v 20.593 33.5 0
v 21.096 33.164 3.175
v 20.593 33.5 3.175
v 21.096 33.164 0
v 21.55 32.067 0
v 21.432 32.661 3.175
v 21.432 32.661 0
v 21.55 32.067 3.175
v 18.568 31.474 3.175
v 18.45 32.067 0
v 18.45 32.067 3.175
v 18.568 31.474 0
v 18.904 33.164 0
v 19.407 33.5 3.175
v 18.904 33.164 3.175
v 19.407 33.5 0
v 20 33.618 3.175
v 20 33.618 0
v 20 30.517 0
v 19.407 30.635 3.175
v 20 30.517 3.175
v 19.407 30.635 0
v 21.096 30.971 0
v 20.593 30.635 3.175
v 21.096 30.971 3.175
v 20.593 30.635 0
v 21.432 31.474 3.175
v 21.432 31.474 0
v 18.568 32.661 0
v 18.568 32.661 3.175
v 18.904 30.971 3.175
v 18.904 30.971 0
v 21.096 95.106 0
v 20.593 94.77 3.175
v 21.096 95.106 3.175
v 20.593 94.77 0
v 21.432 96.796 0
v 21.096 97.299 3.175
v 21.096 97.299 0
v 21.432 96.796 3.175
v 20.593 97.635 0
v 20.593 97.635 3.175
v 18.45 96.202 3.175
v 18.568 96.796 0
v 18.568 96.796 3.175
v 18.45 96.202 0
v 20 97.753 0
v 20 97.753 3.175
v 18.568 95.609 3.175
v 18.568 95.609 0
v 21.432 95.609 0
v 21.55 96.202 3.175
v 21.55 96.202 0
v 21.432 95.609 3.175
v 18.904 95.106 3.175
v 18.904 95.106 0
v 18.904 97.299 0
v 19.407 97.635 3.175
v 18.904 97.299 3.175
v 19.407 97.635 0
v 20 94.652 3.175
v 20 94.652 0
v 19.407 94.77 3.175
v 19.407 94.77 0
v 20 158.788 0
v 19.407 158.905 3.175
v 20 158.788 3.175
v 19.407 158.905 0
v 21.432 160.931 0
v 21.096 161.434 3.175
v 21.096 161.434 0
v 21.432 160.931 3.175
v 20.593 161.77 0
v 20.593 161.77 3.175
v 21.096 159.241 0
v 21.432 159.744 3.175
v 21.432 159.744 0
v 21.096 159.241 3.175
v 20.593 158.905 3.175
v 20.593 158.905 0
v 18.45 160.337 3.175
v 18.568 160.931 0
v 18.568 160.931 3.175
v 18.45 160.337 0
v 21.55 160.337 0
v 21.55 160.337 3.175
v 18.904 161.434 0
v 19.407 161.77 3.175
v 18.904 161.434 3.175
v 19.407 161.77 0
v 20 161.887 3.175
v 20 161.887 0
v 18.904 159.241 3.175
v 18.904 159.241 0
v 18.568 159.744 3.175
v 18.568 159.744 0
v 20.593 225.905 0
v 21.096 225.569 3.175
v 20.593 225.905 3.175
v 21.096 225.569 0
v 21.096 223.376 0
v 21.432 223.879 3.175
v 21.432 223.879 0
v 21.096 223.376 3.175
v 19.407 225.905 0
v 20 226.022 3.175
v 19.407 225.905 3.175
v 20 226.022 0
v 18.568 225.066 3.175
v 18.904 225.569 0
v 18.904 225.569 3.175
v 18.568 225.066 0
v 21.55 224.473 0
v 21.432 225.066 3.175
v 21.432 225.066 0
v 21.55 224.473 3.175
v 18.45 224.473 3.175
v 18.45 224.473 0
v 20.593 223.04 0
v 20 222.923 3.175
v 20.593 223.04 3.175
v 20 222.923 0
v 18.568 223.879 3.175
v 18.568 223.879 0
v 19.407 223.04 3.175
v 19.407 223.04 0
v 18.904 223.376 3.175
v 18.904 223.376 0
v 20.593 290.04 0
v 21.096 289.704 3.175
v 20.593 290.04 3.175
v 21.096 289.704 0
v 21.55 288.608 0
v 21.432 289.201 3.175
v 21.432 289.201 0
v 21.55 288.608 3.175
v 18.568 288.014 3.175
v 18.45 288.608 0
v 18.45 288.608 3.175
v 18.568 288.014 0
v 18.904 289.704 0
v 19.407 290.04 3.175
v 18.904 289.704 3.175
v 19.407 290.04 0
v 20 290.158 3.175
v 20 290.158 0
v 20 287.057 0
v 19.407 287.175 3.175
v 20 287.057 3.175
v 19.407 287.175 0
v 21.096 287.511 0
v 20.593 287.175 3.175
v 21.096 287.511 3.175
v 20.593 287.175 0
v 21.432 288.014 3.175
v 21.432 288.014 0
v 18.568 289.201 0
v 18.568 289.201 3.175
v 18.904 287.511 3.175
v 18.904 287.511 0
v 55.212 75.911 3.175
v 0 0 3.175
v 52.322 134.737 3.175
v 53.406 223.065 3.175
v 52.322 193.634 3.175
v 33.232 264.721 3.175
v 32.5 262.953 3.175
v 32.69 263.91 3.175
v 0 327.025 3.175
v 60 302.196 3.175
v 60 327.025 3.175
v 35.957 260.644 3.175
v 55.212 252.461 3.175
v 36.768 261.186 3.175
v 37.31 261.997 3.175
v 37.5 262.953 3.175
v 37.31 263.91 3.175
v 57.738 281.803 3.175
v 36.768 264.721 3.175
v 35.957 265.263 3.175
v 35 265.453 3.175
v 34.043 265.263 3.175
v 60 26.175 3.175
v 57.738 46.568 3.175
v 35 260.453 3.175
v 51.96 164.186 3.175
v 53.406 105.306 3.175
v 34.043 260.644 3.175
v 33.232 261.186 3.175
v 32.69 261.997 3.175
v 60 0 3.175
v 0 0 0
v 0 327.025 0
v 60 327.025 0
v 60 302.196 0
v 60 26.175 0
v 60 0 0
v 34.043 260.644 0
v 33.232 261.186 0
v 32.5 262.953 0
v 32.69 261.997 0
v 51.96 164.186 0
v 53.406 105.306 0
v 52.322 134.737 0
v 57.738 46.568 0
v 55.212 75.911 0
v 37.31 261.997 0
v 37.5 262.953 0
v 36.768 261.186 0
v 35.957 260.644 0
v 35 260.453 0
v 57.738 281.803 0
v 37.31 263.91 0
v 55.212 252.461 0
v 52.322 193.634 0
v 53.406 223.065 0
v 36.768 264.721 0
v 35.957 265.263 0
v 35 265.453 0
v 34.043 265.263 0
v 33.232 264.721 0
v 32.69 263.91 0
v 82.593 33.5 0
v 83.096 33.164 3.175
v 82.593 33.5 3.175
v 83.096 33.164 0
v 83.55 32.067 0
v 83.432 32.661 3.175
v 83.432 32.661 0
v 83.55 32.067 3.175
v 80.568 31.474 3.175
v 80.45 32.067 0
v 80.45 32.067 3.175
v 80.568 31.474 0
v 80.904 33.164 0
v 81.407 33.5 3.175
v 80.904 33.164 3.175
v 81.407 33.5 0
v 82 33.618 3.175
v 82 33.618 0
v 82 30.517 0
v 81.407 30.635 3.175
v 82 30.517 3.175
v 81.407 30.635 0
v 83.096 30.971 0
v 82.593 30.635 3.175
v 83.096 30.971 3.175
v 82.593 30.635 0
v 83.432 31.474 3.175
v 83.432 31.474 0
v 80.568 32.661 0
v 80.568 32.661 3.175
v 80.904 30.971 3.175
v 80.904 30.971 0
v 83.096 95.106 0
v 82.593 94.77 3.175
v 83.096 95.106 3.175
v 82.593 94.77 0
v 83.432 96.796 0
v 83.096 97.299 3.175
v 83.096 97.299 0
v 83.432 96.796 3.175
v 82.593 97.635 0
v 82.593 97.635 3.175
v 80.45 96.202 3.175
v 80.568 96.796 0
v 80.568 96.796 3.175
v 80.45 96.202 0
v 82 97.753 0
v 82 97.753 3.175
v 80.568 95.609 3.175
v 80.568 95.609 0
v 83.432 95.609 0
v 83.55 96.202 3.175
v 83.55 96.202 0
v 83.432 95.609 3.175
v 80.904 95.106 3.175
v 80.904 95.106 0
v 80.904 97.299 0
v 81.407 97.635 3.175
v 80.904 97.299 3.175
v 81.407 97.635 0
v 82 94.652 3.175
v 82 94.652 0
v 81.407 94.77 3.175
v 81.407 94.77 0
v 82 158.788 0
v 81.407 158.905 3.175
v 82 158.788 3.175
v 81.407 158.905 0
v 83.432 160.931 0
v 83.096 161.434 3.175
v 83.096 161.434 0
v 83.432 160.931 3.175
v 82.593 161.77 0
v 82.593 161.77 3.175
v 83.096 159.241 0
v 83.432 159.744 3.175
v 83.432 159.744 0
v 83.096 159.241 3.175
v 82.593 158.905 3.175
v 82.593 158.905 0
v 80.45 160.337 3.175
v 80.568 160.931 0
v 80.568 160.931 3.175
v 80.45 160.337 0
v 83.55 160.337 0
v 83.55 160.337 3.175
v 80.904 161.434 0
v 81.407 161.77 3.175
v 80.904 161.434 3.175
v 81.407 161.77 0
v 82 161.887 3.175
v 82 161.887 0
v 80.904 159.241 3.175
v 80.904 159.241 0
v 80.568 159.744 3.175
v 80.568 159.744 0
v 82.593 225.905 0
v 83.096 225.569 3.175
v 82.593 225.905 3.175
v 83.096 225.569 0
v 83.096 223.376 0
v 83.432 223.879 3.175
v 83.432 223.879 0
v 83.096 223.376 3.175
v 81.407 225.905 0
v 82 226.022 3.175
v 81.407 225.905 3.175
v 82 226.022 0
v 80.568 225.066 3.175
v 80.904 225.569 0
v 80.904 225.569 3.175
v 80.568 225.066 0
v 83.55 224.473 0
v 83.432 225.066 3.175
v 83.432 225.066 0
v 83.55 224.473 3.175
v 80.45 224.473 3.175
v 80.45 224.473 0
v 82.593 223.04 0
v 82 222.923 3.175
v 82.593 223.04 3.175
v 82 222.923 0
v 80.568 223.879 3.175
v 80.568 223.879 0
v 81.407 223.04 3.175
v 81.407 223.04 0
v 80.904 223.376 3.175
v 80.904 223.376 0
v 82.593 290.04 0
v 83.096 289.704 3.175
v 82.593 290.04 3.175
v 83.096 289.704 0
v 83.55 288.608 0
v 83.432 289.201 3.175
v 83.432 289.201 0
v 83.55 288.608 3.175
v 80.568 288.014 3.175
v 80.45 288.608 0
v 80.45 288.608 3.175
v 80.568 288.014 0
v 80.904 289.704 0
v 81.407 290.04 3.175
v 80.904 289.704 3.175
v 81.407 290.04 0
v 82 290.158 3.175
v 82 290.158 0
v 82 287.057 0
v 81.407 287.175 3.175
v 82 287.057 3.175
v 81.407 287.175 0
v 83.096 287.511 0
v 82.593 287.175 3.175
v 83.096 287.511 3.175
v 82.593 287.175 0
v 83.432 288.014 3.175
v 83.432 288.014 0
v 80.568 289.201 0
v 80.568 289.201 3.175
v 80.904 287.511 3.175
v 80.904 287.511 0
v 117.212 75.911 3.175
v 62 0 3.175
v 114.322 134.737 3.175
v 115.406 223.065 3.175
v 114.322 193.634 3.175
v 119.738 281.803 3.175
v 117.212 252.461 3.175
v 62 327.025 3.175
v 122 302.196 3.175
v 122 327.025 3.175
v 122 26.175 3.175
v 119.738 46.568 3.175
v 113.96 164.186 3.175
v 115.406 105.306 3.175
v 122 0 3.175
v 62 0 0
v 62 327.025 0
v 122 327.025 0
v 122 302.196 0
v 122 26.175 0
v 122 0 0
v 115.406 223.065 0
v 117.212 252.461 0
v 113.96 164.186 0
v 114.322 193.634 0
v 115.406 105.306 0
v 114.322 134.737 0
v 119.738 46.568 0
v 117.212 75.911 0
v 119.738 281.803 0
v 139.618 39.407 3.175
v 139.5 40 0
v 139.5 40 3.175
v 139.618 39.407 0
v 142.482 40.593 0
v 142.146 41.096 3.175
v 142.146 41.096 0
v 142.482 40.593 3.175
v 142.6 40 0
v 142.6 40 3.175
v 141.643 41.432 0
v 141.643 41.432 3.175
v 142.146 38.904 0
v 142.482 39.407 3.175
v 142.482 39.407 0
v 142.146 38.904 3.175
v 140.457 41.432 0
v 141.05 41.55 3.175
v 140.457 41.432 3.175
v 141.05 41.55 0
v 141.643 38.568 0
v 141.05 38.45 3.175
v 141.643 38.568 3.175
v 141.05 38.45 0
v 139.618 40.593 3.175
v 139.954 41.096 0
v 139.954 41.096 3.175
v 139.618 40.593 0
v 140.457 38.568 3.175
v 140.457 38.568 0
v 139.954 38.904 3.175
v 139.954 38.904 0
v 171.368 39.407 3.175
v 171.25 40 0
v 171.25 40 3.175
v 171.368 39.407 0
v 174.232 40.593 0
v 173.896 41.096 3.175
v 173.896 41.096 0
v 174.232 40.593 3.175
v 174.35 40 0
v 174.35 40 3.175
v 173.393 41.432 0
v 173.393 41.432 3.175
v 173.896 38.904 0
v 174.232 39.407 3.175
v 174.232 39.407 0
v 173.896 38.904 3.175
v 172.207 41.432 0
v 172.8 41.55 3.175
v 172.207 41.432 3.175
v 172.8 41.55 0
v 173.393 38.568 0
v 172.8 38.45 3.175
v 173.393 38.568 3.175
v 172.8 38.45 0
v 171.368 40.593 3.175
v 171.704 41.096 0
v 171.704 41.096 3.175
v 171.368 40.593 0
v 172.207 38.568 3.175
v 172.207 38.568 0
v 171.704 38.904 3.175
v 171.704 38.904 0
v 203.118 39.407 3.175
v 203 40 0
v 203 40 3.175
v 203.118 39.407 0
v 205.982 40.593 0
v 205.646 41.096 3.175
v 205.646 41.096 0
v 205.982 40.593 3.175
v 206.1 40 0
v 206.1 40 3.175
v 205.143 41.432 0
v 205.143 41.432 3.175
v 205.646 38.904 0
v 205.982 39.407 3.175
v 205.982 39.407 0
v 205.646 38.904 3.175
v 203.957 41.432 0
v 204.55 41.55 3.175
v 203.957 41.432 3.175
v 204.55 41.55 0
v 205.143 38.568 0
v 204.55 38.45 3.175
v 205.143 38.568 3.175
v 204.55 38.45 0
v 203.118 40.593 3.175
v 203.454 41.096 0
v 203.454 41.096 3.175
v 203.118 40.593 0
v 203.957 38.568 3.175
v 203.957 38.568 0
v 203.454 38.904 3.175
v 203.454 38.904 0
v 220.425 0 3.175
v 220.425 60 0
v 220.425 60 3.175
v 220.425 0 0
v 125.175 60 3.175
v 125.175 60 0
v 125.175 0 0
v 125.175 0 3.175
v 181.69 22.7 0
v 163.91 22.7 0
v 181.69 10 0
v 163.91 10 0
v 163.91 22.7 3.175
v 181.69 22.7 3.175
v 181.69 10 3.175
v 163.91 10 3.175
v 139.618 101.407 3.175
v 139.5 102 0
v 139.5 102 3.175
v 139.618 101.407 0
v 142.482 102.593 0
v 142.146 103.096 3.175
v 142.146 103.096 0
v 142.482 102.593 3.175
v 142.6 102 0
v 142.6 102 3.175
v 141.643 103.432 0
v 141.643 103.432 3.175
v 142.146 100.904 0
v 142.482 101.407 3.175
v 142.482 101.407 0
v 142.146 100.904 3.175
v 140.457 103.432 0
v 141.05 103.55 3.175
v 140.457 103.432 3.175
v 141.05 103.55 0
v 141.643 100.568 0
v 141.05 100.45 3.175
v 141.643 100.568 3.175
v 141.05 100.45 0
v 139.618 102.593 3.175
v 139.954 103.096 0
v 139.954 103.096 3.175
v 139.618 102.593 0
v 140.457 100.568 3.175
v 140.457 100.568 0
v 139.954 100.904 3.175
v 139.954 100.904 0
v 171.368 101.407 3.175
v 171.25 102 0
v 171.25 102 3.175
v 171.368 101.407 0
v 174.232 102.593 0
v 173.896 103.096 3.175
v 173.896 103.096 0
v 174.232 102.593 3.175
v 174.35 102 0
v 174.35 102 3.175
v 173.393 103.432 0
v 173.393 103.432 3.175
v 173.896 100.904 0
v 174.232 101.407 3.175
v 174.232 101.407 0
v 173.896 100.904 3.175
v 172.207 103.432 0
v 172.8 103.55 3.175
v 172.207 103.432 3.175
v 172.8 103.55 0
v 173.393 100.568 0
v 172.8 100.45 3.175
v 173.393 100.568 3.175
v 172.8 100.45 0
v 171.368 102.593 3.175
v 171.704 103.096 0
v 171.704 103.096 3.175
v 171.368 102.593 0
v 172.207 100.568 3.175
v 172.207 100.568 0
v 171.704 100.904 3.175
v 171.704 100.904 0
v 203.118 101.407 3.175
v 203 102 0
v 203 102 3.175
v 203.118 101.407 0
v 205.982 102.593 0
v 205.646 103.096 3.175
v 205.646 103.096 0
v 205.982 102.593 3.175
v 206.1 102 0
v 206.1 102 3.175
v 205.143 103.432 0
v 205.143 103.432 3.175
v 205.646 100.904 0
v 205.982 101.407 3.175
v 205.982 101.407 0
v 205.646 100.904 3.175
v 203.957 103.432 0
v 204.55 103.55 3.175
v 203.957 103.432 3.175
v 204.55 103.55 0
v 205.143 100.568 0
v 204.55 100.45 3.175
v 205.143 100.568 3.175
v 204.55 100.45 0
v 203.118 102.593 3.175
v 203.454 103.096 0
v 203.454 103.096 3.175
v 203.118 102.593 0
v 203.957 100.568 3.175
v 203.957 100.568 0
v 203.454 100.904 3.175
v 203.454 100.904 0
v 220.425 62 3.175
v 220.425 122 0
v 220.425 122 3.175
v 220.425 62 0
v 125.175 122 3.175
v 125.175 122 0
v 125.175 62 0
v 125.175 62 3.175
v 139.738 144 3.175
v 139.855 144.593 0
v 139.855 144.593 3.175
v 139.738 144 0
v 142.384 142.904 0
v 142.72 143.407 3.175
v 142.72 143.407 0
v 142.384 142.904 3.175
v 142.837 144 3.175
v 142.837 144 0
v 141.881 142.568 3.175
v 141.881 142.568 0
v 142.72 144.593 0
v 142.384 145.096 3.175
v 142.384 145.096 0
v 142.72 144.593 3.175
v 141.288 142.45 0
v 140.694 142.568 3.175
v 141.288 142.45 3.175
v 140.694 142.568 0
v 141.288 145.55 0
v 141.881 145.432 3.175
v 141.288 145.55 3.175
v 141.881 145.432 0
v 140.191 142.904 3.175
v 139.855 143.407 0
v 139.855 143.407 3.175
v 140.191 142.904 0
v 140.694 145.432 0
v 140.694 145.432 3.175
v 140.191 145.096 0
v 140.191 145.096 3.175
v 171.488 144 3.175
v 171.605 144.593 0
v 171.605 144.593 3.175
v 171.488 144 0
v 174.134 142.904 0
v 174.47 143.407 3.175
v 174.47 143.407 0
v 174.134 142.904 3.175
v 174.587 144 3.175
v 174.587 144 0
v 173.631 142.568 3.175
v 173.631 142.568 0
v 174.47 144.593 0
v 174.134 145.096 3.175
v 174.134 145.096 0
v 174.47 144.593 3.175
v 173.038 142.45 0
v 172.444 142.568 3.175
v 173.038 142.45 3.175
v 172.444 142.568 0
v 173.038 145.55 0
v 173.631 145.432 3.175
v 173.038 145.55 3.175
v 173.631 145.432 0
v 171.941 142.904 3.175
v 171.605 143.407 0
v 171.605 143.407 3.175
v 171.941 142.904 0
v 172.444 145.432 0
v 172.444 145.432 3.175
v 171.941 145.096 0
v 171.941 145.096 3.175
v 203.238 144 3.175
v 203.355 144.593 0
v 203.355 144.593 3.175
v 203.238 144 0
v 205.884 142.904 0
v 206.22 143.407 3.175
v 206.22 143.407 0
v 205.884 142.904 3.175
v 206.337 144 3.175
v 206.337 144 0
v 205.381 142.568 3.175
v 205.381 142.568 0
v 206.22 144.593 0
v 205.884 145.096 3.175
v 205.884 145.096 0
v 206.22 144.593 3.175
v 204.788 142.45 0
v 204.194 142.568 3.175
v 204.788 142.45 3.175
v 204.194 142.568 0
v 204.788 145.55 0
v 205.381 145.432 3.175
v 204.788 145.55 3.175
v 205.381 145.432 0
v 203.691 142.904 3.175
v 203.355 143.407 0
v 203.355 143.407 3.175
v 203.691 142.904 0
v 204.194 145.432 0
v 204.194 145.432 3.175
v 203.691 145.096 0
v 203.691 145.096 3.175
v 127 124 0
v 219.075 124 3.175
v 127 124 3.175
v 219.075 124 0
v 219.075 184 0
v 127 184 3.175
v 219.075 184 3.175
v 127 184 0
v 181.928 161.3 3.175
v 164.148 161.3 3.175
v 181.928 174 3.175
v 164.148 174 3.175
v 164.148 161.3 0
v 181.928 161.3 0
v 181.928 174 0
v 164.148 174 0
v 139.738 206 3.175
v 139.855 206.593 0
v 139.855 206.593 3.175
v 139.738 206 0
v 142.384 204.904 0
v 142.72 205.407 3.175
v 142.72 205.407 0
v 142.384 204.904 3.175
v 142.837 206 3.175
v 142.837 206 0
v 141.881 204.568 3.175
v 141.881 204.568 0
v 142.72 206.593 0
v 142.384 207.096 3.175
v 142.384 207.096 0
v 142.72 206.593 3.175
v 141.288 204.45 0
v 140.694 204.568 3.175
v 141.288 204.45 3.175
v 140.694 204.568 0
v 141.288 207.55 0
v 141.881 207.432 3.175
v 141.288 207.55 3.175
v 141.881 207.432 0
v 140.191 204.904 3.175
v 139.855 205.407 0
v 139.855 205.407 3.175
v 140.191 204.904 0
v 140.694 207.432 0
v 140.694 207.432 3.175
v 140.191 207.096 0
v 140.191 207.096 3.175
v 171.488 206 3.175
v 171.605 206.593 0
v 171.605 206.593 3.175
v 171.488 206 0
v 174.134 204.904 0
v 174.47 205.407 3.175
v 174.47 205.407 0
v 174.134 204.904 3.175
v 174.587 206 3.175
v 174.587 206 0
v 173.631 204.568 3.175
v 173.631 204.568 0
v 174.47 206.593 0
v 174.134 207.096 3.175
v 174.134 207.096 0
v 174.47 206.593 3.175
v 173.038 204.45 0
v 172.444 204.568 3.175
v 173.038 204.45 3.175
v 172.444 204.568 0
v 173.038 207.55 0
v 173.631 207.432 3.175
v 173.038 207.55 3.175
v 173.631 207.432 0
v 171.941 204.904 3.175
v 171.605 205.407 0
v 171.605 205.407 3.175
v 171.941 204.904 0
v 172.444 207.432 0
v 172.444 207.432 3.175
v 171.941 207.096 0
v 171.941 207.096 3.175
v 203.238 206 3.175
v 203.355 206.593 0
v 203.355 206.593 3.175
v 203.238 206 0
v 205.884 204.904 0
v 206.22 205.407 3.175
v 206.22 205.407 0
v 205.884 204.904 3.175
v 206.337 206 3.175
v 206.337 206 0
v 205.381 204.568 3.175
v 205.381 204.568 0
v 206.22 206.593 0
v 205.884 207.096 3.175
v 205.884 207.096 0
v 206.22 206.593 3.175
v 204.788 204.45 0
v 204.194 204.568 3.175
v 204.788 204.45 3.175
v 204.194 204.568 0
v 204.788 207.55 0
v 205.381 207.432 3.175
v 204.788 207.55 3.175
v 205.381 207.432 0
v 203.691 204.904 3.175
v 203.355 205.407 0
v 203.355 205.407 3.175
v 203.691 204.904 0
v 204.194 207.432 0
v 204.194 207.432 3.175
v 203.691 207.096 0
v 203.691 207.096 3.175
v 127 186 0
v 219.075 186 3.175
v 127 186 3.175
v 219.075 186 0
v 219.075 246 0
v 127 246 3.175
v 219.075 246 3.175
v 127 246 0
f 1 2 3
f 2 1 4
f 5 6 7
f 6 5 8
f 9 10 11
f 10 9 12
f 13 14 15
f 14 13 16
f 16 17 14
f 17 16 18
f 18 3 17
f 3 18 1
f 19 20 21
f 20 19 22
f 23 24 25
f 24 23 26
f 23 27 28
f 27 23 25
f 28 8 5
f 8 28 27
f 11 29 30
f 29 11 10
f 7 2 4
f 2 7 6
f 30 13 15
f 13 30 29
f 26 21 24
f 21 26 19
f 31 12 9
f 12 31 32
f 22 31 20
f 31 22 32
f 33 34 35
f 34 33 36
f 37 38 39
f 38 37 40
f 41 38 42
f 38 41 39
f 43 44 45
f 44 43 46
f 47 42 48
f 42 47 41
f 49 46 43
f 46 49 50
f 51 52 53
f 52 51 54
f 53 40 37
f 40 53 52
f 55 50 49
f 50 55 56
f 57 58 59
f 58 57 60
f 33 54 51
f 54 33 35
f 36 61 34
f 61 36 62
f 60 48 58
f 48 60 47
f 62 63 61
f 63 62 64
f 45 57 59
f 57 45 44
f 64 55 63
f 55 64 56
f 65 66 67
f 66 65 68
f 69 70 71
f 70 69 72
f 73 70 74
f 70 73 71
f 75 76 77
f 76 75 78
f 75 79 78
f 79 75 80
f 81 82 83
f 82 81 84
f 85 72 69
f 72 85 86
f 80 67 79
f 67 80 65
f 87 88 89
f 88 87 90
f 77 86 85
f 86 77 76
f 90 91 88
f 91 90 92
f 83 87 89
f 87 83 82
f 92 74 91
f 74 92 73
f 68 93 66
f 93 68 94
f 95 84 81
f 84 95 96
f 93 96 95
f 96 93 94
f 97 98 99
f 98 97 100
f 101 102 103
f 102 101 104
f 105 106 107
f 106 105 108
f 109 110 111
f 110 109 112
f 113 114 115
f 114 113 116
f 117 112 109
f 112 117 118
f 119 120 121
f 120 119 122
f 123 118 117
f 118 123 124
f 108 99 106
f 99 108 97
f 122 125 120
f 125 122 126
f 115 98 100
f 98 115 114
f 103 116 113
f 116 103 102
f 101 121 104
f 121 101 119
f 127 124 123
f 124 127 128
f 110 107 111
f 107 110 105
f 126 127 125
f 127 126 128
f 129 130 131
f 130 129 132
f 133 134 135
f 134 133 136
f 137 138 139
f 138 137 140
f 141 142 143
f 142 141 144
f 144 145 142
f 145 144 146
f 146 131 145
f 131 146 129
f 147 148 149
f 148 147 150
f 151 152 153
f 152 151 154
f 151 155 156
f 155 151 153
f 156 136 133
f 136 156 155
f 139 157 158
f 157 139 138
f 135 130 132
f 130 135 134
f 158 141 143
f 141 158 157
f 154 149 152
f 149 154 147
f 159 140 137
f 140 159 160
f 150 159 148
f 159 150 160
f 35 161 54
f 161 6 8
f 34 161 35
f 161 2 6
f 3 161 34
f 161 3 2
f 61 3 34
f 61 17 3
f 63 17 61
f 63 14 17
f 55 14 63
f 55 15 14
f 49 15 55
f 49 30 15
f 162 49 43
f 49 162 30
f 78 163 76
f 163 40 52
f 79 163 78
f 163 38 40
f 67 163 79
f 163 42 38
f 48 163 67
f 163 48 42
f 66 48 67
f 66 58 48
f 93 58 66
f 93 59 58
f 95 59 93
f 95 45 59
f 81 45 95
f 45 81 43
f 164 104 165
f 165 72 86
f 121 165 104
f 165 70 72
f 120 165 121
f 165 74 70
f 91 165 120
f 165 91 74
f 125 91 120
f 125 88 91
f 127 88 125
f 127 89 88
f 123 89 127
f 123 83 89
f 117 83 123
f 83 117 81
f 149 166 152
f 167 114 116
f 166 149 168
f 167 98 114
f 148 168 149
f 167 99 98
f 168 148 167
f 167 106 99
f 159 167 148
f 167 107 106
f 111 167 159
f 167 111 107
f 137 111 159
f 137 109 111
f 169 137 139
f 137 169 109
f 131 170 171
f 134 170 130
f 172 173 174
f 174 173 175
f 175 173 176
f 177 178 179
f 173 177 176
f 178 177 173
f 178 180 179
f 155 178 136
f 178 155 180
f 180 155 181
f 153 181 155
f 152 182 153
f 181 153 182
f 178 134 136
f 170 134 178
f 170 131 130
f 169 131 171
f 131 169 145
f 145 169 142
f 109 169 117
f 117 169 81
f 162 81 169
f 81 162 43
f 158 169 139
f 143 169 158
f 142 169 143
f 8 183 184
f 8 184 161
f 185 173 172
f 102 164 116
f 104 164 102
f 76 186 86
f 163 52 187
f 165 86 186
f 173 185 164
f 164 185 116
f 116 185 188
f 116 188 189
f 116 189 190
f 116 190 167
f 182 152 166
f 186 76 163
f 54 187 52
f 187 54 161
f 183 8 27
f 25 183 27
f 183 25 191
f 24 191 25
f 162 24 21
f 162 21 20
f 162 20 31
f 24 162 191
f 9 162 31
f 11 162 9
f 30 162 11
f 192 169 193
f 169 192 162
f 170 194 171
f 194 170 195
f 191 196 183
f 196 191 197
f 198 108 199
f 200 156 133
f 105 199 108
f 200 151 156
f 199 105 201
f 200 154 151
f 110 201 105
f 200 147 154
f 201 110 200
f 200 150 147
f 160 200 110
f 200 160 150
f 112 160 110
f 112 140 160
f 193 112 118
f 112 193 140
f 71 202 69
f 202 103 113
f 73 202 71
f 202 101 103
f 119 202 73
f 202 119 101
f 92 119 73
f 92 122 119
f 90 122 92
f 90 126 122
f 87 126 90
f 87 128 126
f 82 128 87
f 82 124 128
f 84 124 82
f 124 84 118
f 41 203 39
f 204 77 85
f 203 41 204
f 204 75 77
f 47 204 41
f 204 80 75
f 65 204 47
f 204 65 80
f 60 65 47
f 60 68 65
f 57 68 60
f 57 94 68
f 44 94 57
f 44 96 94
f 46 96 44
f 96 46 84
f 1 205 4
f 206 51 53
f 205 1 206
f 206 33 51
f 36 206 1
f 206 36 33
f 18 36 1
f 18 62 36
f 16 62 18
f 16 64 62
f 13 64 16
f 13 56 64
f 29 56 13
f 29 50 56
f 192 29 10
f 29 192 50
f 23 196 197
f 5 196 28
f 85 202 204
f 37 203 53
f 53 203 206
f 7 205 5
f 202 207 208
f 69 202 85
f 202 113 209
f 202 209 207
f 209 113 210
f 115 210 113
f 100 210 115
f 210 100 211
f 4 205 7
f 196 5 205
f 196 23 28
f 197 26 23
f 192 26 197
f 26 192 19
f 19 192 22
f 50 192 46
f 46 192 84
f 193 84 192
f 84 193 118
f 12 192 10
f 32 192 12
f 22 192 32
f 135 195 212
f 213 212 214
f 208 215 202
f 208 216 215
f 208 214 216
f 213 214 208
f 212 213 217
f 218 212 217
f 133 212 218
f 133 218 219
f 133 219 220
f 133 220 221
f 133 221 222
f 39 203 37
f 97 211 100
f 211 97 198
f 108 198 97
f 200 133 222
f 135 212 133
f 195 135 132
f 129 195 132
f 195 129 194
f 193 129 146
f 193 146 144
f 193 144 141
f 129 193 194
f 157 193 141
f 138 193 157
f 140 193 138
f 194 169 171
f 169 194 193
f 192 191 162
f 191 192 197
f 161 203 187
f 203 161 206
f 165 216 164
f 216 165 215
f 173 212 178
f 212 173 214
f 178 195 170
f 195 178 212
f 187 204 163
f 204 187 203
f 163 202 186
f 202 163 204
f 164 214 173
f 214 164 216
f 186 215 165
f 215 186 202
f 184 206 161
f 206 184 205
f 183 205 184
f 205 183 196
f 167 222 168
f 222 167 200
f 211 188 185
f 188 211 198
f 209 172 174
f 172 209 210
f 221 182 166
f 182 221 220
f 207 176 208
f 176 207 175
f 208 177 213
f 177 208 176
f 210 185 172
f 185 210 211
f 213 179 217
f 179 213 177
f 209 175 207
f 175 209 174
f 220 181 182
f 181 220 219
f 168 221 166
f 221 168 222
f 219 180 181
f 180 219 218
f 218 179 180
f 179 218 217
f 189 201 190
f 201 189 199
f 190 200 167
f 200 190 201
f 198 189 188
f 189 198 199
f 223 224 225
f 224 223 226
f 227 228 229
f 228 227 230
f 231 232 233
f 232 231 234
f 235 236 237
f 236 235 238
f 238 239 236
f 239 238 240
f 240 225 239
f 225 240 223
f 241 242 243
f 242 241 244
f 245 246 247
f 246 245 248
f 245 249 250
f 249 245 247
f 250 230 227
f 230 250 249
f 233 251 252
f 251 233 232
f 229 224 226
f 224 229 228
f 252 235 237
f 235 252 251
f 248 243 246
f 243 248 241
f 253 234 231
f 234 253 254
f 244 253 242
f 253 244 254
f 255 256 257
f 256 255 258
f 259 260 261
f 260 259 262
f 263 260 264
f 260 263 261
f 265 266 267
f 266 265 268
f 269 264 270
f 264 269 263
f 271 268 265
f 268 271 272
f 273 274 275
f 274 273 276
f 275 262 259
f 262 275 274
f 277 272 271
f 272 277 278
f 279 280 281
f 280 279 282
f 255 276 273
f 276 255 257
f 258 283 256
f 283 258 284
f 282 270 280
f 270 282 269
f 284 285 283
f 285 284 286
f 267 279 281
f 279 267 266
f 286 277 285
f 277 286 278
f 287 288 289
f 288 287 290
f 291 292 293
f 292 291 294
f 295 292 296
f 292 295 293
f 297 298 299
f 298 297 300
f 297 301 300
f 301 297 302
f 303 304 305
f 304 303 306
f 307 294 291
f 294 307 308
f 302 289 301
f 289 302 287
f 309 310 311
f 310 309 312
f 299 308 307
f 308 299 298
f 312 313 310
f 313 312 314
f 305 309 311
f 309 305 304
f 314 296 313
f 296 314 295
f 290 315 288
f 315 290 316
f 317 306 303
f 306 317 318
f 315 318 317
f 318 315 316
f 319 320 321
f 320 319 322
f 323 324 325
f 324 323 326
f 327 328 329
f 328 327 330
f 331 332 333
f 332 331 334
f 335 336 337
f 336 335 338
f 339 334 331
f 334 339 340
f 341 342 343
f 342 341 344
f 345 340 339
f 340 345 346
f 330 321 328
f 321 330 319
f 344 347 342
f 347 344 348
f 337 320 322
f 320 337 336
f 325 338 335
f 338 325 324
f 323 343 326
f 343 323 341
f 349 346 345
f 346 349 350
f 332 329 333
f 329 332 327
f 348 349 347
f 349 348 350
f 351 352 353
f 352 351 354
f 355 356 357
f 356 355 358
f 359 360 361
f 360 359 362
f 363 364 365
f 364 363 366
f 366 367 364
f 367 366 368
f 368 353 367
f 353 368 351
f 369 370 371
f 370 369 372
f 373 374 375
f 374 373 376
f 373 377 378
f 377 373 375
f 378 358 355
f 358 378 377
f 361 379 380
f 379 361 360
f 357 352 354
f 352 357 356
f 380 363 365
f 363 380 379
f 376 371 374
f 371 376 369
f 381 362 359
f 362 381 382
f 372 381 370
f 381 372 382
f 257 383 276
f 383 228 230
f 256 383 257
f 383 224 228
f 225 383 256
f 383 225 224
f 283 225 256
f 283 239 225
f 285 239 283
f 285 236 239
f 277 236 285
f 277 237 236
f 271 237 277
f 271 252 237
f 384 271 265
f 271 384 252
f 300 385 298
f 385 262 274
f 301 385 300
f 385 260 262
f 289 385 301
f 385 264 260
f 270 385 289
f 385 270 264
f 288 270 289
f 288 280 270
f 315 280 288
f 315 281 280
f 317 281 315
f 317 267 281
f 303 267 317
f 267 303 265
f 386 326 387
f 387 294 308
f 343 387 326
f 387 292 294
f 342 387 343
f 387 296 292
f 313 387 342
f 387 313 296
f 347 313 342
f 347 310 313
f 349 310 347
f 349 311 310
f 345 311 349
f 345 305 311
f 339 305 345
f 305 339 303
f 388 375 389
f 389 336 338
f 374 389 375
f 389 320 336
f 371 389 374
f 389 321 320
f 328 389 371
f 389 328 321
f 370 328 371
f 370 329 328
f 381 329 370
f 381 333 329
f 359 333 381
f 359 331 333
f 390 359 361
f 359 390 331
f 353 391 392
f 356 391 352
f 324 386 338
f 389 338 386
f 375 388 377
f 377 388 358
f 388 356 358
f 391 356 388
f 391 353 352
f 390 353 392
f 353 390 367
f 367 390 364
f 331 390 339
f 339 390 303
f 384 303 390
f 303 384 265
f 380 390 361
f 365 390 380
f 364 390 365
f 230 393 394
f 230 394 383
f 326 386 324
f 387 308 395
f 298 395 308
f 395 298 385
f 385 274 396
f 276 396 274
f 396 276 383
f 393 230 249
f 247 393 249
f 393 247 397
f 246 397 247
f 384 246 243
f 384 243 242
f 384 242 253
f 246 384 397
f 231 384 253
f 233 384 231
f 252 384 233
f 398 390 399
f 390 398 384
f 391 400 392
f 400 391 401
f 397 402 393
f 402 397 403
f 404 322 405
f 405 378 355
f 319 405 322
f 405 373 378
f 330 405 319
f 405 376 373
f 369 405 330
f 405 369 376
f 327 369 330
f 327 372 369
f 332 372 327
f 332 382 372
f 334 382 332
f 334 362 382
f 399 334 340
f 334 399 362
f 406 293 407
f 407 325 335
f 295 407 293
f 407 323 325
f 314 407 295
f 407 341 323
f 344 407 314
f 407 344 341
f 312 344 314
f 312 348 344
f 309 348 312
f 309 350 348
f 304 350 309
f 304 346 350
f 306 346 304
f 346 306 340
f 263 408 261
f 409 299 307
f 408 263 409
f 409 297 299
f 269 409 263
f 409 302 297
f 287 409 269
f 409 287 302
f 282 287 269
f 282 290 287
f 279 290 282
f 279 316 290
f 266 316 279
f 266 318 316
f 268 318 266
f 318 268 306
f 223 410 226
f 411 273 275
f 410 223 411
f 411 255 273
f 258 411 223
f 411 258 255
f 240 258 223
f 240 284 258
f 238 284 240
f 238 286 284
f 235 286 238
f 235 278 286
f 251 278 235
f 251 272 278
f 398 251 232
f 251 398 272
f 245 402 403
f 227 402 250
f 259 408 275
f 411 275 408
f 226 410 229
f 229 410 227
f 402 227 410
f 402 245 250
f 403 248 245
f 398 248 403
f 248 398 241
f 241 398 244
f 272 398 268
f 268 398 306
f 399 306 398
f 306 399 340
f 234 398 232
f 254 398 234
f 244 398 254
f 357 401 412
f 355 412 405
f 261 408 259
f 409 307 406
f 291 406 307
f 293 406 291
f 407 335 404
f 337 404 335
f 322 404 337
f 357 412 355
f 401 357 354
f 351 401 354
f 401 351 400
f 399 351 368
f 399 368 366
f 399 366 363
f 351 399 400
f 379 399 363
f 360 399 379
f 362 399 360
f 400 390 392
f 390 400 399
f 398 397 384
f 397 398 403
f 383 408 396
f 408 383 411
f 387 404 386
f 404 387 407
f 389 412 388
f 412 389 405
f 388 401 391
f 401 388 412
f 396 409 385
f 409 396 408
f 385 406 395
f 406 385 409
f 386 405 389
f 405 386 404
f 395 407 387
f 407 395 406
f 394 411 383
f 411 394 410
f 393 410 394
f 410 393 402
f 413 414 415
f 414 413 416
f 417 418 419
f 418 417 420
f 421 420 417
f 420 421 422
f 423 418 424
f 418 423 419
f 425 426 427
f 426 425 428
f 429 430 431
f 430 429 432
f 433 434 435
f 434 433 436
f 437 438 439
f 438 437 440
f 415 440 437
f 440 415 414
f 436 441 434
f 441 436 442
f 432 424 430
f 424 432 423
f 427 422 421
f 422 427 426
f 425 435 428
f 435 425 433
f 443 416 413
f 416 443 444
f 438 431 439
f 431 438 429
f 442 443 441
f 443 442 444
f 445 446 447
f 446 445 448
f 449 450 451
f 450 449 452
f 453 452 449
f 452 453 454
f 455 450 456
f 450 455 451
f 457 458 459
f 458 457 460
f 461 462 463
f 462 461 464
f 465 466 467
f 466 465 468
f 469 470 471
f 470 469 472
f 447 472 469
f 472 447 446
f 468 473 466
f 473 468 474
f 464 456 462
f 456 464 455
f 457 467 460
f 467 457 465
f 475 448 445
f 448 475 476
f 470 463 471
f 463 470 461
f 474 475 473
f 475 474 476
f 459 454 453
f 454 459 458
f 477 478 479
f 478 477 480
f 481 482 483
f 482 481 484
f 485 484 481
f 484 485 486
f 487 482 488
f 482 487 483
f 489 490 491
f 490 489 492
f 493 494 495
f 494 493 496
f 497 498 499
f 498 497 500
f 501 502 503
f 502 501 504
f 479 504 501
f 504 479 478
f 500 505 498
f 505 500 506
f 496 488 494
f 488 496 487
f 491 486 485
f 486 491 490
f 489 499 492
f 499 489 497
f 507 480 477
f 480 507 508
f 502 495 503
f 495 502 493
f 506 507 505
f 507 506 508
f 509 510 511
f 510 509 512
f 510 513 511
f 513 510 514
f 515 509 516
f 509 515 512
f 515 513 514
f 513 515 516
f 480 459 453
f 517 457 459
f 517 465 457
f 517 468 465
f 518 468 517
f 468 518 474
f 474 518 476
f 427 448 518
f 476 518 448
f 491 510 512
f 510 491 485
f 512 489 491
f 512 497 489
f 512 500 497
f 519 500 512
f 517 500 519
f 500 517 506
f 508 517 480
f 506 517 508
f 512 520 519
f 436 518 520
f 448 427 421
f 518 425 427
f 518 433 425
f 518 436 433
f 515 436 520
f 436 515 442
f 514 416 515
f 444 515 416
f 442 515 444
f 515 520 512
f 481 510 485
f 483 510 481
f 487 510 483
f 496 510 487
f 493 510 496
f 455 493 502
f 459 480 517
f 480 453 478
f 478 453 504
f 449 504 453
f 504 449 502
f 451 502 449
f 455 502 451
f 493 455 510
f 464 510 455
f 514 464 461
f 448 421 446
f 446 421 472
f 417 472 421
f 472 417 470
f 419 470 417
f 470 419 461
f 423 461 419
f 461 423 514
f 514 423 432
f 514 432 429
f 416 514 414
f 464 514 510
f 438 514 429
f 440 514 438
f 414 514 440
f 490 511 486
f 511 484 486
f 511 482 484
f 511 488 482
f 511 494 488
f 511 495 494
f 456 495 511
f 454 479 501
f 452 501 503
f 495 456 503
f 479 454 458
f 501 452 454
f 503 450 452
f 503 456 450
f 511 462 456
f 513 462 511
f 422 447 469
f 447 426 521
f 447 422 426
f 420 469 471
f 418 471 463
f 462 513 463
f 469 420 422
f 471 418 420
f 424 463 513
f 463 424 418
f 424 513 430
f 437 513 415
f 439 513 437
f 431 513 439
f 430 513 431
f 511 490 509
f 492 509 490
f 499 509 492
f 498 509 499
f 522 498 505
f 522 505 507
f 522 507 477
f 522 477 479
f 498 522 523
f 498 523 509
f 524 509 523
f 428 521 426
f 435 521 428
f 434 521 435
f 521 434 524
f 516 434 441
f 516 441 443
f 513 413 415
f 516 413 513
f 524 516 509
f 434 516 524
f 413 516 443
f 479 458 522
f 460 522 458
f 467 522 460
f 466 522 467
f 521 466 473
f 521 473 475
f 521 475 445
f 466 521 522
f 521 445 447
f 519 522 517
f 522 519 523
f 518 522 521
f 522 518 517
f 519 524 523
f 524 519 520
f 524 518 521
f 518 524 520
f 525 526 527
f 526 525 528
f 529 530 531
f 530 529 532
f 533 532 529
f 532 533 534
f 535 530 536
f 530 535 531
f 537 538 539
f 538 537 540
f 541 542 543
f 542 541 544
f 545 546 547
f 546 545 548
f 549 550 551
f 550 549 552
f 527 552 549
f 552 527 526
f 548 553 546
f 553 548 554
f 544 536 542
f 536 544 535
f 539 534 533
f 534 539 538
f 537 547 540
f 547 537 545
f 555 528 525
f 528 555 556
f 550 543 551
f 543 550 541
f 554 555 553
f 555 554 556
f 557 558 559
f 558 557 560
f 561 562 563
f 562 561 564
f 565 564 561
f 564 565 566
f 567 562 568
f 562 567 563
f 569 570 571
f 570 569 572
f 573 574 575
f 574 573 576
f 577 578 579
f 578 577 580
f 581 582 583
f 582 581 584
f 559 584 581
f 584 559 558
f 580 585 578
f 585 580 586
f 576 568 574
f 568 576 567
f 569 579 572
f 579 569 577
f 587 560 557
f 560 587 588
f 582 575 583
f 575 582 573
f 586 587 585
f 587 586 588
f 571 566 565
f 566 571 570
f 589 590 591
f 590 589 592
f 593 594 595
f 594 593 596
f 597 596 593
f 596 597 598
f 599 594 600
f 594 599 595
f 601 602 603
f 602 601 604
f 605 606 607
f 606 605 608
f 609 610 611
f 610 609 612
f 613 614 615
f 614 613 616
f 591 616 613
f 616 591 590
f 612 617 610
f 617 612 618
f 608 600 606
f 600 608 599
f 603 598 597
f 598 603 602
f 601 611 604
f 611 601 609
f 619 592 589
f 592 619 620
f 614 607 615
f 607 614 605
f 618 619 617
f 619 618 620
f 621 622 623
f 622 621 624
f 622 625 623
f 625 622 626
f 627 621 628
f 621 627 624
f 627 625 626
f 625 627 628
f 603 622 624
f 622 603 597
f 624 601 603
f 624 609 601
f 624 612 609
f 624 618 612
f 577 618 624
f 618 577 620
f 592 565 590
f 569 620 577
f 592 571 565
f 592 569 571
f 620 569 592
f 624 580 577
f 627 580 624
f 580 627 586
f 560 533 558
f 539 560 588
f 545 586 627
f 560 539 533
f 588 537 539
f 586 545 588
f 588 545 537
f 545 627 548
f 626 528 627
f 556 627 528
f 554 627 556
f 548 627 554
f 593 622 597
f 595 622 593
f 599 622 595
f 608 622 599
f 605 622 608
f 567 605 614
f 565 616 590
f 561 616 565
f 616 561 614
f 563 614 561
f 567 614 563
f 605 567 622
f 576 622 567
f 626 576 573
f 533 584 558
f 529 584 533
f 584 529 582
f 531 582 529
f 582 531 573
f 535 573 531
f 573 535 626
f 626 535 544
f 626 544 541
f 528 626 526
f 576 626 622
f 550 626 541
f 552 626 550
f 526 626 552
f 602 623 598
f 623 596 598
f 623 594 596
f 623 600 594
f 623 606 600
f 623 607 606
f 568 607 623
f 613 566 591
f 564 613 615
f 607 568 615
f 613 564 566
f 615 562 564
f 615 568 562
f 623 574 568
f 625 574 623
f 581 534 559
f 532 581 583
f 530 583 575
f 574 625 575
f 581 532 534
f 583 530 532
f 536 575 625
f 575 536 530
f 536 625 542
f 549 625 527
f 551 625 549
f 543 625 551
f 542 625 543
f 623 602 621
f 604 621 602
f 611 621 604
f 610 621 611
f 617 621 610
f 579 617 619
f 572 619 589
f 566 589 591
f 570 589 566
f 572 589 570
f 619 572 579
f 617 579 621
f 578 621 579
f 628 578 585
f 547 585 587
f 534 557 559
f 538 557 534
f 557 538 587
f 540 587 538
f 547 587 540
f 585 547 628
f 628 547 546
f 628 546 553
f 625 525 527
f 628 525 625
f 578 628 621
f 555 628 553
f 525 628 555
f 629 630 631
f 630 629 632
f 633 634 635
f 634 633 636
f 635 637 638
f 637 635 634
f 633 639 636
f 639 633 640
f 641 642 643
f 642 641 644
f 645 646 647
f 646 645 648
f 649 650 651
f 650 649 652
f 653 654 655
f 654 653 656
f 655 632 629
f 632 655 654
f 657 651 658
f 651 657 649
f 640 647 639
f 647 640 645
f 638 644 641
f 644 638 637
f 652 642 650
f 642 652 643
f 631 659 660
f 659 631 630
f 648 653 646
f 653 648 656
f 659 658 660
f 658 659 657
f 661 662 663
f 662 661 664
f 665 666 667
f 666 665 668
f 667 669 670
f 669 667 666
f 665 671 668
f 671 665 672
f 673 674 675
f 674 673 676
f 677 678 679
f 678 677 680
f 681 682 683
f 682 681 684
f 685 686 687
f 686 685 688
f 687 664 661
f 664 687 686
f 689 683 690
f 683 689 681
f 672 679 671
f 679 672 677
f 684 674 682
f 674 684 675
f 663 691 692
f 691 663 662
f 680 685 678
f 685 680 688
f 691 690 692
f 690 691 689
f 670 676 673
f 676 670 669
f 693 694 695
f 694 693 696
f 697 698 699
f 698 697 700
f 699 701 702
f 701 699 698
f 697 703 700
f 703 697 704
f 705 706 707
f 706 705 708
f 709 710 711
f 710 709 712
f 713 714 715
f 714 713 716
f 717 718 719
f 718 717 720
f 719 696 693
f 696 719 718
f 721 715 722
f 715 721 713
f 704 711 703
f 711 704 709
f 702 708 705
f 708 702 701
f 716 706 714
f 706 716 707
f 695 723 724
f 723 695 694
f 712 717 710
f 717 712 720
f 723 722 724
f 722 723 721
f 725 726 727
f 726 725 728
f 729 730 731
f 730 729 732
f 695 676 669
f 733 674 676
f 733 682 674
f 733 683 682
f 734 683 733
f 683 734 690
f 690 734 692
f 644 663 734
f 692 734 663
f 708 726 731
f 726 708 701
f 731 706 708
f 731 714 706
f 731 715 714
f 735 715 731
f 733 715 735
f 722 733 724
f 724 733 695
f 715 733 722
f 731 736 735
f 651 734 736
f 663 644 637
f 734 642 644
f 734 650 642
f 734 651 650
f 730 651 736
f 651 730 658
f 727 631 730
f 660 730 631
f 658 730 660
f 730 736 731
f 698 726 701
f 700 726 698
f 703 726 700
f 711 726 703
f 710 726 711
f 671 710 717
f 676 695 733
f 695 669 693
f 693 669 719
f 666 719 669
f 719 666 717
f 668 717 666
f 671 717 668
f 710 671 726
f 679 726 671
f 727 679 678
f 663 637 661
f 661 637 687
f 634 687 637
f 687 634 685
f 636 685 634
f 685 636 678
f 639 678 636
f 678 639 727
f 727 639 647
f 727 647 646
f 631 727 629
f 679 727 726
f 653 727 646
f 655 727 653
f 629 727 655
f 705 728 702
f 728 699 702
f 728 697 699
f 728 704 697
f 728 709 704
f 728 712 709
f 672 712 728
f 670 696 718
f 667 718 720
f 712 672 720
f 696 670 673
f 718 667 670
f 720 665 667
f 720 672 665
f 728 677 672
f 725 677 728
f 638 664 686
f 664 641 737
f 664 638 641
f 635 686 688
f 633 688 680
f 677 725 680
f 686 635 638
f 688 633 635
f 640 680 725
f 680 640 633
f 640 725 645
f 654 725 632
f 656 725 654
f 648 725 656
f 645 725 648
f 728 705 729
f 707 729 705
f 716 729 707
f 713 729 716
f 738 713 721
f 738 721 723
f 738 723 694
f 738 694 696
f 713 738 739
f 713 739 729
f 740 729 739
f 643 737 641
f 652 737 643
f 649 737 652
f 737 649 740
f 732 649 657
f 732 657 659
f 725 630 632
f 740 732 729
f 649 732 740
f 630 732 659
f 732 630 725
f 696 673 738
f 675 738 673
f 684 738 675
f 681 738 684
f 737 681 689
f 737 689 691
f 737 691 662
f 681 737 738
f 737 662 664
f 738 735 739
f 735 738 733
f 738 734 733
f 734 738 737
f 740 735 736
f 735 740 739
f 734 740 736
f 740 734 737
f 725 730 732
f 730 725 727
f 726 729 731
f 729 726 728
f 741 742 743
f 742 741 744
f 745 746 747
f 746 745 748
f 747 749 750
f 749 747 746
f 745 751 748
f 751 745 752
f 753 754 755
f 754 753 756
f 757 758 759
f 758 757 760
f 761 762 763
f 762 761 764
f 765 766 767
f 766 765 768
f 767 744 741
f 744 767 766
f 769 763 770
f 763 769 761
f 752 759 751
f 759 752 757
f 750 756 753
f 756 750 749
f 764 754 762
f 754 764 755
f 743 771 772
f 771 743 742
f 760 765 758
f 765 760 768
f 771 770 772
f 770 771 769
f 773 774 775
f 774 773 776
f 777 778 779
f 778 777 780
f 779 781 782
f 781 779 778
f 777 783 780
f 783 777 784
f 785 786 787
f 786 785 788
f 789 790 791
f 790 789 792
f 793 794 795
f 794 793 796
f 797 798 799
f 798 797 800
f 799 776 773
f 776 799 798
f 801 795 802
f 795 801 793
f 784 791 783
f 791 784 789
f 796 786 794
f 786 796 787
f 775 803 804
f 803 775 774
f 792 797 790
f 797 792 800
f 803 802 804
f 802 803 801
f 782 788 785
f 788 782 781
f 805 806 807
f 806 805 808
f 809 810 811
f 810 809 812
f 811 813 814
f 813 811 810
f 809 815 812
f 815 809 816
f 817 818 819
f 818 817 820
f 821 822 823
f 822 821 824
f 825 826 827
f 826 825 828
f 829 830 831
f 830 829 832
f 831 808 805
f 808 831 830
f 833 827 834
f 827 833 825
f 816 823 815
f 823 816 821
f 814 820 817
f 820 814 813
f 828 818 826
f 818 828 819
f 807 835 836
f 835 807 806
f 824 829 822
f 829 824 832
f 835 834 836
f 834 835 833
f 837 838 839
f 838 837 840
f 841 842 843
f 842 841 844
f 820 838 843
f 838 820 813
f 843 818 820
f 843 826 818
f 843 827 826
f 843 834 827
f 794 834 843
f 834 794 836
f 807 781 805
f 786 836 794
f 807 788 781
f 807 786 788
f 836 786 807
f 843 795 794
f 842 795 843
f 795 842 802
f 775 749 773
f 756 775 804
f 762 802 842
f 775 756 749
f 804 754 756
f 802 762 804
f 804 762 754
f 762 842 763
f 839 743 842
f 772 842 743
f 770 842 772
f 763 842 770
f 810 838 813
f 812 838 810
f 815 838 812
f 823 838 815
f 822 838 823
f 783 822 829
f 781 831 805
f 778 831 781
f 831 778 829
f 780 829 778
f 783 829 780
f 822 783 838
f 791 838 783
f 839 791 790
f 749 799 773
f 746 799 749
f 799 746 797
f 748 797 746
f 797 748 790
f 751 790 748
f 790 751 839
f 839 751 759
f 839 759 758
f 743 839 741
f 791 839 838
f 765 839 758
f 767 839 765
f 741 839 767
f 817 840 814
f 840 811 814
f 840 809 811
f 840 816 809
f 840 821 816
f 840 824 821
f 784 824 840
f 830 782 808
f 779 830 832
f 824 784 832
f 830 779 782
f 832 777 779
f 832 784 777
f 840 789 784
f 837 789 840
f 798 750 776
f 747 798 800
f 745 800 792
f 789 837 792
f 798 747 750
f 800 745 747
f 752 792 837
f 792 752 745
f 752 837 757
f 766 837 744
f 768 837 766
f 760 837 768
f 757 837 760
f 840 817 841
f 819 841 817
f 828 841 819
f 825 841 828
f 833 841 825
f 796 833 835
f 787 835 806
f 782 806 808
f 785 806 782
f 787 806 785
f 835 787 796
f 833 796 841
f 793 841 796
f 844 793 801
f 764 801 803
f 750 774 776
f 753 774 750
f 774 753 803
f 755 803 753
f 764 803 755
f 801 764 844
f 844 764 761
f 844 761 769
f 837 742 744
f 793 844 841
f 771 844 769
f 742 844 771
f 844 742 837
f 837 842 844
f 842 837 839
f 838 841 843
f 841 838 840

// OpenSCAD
function mm(inch) = (inch * 25.4);

$length = mm(12.625);
$width = mm(3.75);
$height = 60;
$thick = mm(1/8);

$fn=16;

// Utility functions
module longside() {
    // Long side

    difference() {
        cube([$thick, $length + $thick*2, $height]);
        translate([-3,0.512*$length, (3.742 * $length) * -0.9933]) {
            rotate([0,90,0]) {
                cylinder(r=3.742 * $length, h=10, $fn=256);
            }
        }
        $hole_count = 5;
        $hole_dist = $length/$hole_count;
        for ( i = [0 : $hole_count-1] ){ 
            translate([-5,(0.5*$hole_dist) + i*$hole_dist,40]) {
                rotate([0,90,0]) {
                    cylinder(r=1.55, h=10);
                }
            }
        }        
    } 
}

module shortside() {
    difference() {
        cube([$width, $thick, $height]);
        $hole_count = 3;
        $hole_dist = $width/$hole_count;
        for ( i = [0 : $hole_count-1] ){ 
            translate([(0.5*$hole_dist) + i*$hole_dist, 5, 40]) {
                rotate([90,0,0]) {
                    cylinder(r=1.55, h=10);
                }
            }
        }  
    }      
}

// Part functions
module pc_left_long() {
    translate([0, 0, 0]) {
        difference() {
            longside();
            translate([-5,$length*0.82,25]) {
                rotate([0,90,0]) {
                    cylinder(r=2.5, h=10);
                }
            }
        }
    }
}


module pc_front_short() {
    //front side
    translate([$thick, 0, 0]) {
        $portwidth = mm(0.7);
        $portheight = mm(0.5);
        difference() {
            shortside();
            translate([$width/2-$portwidth/2,-2, 10]) {
                cube([$portwidth,10, $portheight]);
            }
        }
    }
}

module pc_front_fill() {
    //front side backing fill
    translate([$thick, $thick, 0]) {
        $portwidth = mm(0.7);
        $portheight = mm(0.5);
        difference() {
            shortside();
            translate([$width/2-$portwidth/2,-2, 10]) {
                cube([$portwidth,10, $portheight]);
            }
            cube([$thick/2,$thick,$height+5]);
            translate([$width-$thick/2, 0, 0]) {
                cube([$thick/2,$thick,$height+5]);
            }        
        }
    }
}

module pc_right_long() {
    translate([$width+$thick, 0, 0]) {
        longside();
    }
}

module pc_back_short() {
    // backside
    translate([$thick, $thick + $length, 0]) {
        shortside();
    }
}

module pc_back_fill() {
    // backside backing filler
    translate([$thick, $length, 0]) {
        difference() {
            shortside();
            cube([$thick/2, $thick, $height+5]);
            translate([$width-$thick/2,0,0]) {
                cube([$thick/2, $thick, $height+5]);
            }
            
        }
    }
}

// Assembly functions
module assembly_built() {
   pc_left_long();
   pc_front_short();
   pc_front_fill();
   pc_right_long();
   pc_back_short();
   pc_back_fill(); 
}

module assembly_flat() {
    $space = 2;
    translate([$height,0,0]) {
        rotate([0,-90,0]) {
            pc_left_long();
        }
    }
    
    
    translate([2*$height+$space,0,-$width-($thick)]) {
        rotate([0,-90,0]) {
               pc_right_long();
        }
    }
    
    //translate([3*$height+2*$space,0,$thick]) {
    translate([2*$height+$space,0,$thick]) {    
        rotate([-90,0,0]) {
            pc_front_short();
        }
    }    
    
    translate([2*$height+$space,$height+$space,2*$thick]) {
        rotate([-90,0,0]) {
            translate([0,-$length,0]) {
                pc_back_short();
            }
        }
    }
    
    translate([2*$height+3.5*$space,3*$height+2*$space,0]) {
        rotate([90,0,0]) {
            translate([-$thick-$thick/2,-$thick,0]) {
                pc_front_fill();
            }            
        }
    }

    translate([2*$height+$space+2.5*$space,4*$height+3*$space,0]) {
        rotate([90,0,0]) {
            translate([-$thick-$thick/2,-$length,0]) {
                pc_back_fill();
            }
        }
    }

    translate([0,0,0]) {
        rotate([0,0,0]) {
            
        }
    }    
    
    
}


//$built = 1;
$built = 0;

if ($built) {
    assembly_built();
} else {
    assembly_flat();
}
